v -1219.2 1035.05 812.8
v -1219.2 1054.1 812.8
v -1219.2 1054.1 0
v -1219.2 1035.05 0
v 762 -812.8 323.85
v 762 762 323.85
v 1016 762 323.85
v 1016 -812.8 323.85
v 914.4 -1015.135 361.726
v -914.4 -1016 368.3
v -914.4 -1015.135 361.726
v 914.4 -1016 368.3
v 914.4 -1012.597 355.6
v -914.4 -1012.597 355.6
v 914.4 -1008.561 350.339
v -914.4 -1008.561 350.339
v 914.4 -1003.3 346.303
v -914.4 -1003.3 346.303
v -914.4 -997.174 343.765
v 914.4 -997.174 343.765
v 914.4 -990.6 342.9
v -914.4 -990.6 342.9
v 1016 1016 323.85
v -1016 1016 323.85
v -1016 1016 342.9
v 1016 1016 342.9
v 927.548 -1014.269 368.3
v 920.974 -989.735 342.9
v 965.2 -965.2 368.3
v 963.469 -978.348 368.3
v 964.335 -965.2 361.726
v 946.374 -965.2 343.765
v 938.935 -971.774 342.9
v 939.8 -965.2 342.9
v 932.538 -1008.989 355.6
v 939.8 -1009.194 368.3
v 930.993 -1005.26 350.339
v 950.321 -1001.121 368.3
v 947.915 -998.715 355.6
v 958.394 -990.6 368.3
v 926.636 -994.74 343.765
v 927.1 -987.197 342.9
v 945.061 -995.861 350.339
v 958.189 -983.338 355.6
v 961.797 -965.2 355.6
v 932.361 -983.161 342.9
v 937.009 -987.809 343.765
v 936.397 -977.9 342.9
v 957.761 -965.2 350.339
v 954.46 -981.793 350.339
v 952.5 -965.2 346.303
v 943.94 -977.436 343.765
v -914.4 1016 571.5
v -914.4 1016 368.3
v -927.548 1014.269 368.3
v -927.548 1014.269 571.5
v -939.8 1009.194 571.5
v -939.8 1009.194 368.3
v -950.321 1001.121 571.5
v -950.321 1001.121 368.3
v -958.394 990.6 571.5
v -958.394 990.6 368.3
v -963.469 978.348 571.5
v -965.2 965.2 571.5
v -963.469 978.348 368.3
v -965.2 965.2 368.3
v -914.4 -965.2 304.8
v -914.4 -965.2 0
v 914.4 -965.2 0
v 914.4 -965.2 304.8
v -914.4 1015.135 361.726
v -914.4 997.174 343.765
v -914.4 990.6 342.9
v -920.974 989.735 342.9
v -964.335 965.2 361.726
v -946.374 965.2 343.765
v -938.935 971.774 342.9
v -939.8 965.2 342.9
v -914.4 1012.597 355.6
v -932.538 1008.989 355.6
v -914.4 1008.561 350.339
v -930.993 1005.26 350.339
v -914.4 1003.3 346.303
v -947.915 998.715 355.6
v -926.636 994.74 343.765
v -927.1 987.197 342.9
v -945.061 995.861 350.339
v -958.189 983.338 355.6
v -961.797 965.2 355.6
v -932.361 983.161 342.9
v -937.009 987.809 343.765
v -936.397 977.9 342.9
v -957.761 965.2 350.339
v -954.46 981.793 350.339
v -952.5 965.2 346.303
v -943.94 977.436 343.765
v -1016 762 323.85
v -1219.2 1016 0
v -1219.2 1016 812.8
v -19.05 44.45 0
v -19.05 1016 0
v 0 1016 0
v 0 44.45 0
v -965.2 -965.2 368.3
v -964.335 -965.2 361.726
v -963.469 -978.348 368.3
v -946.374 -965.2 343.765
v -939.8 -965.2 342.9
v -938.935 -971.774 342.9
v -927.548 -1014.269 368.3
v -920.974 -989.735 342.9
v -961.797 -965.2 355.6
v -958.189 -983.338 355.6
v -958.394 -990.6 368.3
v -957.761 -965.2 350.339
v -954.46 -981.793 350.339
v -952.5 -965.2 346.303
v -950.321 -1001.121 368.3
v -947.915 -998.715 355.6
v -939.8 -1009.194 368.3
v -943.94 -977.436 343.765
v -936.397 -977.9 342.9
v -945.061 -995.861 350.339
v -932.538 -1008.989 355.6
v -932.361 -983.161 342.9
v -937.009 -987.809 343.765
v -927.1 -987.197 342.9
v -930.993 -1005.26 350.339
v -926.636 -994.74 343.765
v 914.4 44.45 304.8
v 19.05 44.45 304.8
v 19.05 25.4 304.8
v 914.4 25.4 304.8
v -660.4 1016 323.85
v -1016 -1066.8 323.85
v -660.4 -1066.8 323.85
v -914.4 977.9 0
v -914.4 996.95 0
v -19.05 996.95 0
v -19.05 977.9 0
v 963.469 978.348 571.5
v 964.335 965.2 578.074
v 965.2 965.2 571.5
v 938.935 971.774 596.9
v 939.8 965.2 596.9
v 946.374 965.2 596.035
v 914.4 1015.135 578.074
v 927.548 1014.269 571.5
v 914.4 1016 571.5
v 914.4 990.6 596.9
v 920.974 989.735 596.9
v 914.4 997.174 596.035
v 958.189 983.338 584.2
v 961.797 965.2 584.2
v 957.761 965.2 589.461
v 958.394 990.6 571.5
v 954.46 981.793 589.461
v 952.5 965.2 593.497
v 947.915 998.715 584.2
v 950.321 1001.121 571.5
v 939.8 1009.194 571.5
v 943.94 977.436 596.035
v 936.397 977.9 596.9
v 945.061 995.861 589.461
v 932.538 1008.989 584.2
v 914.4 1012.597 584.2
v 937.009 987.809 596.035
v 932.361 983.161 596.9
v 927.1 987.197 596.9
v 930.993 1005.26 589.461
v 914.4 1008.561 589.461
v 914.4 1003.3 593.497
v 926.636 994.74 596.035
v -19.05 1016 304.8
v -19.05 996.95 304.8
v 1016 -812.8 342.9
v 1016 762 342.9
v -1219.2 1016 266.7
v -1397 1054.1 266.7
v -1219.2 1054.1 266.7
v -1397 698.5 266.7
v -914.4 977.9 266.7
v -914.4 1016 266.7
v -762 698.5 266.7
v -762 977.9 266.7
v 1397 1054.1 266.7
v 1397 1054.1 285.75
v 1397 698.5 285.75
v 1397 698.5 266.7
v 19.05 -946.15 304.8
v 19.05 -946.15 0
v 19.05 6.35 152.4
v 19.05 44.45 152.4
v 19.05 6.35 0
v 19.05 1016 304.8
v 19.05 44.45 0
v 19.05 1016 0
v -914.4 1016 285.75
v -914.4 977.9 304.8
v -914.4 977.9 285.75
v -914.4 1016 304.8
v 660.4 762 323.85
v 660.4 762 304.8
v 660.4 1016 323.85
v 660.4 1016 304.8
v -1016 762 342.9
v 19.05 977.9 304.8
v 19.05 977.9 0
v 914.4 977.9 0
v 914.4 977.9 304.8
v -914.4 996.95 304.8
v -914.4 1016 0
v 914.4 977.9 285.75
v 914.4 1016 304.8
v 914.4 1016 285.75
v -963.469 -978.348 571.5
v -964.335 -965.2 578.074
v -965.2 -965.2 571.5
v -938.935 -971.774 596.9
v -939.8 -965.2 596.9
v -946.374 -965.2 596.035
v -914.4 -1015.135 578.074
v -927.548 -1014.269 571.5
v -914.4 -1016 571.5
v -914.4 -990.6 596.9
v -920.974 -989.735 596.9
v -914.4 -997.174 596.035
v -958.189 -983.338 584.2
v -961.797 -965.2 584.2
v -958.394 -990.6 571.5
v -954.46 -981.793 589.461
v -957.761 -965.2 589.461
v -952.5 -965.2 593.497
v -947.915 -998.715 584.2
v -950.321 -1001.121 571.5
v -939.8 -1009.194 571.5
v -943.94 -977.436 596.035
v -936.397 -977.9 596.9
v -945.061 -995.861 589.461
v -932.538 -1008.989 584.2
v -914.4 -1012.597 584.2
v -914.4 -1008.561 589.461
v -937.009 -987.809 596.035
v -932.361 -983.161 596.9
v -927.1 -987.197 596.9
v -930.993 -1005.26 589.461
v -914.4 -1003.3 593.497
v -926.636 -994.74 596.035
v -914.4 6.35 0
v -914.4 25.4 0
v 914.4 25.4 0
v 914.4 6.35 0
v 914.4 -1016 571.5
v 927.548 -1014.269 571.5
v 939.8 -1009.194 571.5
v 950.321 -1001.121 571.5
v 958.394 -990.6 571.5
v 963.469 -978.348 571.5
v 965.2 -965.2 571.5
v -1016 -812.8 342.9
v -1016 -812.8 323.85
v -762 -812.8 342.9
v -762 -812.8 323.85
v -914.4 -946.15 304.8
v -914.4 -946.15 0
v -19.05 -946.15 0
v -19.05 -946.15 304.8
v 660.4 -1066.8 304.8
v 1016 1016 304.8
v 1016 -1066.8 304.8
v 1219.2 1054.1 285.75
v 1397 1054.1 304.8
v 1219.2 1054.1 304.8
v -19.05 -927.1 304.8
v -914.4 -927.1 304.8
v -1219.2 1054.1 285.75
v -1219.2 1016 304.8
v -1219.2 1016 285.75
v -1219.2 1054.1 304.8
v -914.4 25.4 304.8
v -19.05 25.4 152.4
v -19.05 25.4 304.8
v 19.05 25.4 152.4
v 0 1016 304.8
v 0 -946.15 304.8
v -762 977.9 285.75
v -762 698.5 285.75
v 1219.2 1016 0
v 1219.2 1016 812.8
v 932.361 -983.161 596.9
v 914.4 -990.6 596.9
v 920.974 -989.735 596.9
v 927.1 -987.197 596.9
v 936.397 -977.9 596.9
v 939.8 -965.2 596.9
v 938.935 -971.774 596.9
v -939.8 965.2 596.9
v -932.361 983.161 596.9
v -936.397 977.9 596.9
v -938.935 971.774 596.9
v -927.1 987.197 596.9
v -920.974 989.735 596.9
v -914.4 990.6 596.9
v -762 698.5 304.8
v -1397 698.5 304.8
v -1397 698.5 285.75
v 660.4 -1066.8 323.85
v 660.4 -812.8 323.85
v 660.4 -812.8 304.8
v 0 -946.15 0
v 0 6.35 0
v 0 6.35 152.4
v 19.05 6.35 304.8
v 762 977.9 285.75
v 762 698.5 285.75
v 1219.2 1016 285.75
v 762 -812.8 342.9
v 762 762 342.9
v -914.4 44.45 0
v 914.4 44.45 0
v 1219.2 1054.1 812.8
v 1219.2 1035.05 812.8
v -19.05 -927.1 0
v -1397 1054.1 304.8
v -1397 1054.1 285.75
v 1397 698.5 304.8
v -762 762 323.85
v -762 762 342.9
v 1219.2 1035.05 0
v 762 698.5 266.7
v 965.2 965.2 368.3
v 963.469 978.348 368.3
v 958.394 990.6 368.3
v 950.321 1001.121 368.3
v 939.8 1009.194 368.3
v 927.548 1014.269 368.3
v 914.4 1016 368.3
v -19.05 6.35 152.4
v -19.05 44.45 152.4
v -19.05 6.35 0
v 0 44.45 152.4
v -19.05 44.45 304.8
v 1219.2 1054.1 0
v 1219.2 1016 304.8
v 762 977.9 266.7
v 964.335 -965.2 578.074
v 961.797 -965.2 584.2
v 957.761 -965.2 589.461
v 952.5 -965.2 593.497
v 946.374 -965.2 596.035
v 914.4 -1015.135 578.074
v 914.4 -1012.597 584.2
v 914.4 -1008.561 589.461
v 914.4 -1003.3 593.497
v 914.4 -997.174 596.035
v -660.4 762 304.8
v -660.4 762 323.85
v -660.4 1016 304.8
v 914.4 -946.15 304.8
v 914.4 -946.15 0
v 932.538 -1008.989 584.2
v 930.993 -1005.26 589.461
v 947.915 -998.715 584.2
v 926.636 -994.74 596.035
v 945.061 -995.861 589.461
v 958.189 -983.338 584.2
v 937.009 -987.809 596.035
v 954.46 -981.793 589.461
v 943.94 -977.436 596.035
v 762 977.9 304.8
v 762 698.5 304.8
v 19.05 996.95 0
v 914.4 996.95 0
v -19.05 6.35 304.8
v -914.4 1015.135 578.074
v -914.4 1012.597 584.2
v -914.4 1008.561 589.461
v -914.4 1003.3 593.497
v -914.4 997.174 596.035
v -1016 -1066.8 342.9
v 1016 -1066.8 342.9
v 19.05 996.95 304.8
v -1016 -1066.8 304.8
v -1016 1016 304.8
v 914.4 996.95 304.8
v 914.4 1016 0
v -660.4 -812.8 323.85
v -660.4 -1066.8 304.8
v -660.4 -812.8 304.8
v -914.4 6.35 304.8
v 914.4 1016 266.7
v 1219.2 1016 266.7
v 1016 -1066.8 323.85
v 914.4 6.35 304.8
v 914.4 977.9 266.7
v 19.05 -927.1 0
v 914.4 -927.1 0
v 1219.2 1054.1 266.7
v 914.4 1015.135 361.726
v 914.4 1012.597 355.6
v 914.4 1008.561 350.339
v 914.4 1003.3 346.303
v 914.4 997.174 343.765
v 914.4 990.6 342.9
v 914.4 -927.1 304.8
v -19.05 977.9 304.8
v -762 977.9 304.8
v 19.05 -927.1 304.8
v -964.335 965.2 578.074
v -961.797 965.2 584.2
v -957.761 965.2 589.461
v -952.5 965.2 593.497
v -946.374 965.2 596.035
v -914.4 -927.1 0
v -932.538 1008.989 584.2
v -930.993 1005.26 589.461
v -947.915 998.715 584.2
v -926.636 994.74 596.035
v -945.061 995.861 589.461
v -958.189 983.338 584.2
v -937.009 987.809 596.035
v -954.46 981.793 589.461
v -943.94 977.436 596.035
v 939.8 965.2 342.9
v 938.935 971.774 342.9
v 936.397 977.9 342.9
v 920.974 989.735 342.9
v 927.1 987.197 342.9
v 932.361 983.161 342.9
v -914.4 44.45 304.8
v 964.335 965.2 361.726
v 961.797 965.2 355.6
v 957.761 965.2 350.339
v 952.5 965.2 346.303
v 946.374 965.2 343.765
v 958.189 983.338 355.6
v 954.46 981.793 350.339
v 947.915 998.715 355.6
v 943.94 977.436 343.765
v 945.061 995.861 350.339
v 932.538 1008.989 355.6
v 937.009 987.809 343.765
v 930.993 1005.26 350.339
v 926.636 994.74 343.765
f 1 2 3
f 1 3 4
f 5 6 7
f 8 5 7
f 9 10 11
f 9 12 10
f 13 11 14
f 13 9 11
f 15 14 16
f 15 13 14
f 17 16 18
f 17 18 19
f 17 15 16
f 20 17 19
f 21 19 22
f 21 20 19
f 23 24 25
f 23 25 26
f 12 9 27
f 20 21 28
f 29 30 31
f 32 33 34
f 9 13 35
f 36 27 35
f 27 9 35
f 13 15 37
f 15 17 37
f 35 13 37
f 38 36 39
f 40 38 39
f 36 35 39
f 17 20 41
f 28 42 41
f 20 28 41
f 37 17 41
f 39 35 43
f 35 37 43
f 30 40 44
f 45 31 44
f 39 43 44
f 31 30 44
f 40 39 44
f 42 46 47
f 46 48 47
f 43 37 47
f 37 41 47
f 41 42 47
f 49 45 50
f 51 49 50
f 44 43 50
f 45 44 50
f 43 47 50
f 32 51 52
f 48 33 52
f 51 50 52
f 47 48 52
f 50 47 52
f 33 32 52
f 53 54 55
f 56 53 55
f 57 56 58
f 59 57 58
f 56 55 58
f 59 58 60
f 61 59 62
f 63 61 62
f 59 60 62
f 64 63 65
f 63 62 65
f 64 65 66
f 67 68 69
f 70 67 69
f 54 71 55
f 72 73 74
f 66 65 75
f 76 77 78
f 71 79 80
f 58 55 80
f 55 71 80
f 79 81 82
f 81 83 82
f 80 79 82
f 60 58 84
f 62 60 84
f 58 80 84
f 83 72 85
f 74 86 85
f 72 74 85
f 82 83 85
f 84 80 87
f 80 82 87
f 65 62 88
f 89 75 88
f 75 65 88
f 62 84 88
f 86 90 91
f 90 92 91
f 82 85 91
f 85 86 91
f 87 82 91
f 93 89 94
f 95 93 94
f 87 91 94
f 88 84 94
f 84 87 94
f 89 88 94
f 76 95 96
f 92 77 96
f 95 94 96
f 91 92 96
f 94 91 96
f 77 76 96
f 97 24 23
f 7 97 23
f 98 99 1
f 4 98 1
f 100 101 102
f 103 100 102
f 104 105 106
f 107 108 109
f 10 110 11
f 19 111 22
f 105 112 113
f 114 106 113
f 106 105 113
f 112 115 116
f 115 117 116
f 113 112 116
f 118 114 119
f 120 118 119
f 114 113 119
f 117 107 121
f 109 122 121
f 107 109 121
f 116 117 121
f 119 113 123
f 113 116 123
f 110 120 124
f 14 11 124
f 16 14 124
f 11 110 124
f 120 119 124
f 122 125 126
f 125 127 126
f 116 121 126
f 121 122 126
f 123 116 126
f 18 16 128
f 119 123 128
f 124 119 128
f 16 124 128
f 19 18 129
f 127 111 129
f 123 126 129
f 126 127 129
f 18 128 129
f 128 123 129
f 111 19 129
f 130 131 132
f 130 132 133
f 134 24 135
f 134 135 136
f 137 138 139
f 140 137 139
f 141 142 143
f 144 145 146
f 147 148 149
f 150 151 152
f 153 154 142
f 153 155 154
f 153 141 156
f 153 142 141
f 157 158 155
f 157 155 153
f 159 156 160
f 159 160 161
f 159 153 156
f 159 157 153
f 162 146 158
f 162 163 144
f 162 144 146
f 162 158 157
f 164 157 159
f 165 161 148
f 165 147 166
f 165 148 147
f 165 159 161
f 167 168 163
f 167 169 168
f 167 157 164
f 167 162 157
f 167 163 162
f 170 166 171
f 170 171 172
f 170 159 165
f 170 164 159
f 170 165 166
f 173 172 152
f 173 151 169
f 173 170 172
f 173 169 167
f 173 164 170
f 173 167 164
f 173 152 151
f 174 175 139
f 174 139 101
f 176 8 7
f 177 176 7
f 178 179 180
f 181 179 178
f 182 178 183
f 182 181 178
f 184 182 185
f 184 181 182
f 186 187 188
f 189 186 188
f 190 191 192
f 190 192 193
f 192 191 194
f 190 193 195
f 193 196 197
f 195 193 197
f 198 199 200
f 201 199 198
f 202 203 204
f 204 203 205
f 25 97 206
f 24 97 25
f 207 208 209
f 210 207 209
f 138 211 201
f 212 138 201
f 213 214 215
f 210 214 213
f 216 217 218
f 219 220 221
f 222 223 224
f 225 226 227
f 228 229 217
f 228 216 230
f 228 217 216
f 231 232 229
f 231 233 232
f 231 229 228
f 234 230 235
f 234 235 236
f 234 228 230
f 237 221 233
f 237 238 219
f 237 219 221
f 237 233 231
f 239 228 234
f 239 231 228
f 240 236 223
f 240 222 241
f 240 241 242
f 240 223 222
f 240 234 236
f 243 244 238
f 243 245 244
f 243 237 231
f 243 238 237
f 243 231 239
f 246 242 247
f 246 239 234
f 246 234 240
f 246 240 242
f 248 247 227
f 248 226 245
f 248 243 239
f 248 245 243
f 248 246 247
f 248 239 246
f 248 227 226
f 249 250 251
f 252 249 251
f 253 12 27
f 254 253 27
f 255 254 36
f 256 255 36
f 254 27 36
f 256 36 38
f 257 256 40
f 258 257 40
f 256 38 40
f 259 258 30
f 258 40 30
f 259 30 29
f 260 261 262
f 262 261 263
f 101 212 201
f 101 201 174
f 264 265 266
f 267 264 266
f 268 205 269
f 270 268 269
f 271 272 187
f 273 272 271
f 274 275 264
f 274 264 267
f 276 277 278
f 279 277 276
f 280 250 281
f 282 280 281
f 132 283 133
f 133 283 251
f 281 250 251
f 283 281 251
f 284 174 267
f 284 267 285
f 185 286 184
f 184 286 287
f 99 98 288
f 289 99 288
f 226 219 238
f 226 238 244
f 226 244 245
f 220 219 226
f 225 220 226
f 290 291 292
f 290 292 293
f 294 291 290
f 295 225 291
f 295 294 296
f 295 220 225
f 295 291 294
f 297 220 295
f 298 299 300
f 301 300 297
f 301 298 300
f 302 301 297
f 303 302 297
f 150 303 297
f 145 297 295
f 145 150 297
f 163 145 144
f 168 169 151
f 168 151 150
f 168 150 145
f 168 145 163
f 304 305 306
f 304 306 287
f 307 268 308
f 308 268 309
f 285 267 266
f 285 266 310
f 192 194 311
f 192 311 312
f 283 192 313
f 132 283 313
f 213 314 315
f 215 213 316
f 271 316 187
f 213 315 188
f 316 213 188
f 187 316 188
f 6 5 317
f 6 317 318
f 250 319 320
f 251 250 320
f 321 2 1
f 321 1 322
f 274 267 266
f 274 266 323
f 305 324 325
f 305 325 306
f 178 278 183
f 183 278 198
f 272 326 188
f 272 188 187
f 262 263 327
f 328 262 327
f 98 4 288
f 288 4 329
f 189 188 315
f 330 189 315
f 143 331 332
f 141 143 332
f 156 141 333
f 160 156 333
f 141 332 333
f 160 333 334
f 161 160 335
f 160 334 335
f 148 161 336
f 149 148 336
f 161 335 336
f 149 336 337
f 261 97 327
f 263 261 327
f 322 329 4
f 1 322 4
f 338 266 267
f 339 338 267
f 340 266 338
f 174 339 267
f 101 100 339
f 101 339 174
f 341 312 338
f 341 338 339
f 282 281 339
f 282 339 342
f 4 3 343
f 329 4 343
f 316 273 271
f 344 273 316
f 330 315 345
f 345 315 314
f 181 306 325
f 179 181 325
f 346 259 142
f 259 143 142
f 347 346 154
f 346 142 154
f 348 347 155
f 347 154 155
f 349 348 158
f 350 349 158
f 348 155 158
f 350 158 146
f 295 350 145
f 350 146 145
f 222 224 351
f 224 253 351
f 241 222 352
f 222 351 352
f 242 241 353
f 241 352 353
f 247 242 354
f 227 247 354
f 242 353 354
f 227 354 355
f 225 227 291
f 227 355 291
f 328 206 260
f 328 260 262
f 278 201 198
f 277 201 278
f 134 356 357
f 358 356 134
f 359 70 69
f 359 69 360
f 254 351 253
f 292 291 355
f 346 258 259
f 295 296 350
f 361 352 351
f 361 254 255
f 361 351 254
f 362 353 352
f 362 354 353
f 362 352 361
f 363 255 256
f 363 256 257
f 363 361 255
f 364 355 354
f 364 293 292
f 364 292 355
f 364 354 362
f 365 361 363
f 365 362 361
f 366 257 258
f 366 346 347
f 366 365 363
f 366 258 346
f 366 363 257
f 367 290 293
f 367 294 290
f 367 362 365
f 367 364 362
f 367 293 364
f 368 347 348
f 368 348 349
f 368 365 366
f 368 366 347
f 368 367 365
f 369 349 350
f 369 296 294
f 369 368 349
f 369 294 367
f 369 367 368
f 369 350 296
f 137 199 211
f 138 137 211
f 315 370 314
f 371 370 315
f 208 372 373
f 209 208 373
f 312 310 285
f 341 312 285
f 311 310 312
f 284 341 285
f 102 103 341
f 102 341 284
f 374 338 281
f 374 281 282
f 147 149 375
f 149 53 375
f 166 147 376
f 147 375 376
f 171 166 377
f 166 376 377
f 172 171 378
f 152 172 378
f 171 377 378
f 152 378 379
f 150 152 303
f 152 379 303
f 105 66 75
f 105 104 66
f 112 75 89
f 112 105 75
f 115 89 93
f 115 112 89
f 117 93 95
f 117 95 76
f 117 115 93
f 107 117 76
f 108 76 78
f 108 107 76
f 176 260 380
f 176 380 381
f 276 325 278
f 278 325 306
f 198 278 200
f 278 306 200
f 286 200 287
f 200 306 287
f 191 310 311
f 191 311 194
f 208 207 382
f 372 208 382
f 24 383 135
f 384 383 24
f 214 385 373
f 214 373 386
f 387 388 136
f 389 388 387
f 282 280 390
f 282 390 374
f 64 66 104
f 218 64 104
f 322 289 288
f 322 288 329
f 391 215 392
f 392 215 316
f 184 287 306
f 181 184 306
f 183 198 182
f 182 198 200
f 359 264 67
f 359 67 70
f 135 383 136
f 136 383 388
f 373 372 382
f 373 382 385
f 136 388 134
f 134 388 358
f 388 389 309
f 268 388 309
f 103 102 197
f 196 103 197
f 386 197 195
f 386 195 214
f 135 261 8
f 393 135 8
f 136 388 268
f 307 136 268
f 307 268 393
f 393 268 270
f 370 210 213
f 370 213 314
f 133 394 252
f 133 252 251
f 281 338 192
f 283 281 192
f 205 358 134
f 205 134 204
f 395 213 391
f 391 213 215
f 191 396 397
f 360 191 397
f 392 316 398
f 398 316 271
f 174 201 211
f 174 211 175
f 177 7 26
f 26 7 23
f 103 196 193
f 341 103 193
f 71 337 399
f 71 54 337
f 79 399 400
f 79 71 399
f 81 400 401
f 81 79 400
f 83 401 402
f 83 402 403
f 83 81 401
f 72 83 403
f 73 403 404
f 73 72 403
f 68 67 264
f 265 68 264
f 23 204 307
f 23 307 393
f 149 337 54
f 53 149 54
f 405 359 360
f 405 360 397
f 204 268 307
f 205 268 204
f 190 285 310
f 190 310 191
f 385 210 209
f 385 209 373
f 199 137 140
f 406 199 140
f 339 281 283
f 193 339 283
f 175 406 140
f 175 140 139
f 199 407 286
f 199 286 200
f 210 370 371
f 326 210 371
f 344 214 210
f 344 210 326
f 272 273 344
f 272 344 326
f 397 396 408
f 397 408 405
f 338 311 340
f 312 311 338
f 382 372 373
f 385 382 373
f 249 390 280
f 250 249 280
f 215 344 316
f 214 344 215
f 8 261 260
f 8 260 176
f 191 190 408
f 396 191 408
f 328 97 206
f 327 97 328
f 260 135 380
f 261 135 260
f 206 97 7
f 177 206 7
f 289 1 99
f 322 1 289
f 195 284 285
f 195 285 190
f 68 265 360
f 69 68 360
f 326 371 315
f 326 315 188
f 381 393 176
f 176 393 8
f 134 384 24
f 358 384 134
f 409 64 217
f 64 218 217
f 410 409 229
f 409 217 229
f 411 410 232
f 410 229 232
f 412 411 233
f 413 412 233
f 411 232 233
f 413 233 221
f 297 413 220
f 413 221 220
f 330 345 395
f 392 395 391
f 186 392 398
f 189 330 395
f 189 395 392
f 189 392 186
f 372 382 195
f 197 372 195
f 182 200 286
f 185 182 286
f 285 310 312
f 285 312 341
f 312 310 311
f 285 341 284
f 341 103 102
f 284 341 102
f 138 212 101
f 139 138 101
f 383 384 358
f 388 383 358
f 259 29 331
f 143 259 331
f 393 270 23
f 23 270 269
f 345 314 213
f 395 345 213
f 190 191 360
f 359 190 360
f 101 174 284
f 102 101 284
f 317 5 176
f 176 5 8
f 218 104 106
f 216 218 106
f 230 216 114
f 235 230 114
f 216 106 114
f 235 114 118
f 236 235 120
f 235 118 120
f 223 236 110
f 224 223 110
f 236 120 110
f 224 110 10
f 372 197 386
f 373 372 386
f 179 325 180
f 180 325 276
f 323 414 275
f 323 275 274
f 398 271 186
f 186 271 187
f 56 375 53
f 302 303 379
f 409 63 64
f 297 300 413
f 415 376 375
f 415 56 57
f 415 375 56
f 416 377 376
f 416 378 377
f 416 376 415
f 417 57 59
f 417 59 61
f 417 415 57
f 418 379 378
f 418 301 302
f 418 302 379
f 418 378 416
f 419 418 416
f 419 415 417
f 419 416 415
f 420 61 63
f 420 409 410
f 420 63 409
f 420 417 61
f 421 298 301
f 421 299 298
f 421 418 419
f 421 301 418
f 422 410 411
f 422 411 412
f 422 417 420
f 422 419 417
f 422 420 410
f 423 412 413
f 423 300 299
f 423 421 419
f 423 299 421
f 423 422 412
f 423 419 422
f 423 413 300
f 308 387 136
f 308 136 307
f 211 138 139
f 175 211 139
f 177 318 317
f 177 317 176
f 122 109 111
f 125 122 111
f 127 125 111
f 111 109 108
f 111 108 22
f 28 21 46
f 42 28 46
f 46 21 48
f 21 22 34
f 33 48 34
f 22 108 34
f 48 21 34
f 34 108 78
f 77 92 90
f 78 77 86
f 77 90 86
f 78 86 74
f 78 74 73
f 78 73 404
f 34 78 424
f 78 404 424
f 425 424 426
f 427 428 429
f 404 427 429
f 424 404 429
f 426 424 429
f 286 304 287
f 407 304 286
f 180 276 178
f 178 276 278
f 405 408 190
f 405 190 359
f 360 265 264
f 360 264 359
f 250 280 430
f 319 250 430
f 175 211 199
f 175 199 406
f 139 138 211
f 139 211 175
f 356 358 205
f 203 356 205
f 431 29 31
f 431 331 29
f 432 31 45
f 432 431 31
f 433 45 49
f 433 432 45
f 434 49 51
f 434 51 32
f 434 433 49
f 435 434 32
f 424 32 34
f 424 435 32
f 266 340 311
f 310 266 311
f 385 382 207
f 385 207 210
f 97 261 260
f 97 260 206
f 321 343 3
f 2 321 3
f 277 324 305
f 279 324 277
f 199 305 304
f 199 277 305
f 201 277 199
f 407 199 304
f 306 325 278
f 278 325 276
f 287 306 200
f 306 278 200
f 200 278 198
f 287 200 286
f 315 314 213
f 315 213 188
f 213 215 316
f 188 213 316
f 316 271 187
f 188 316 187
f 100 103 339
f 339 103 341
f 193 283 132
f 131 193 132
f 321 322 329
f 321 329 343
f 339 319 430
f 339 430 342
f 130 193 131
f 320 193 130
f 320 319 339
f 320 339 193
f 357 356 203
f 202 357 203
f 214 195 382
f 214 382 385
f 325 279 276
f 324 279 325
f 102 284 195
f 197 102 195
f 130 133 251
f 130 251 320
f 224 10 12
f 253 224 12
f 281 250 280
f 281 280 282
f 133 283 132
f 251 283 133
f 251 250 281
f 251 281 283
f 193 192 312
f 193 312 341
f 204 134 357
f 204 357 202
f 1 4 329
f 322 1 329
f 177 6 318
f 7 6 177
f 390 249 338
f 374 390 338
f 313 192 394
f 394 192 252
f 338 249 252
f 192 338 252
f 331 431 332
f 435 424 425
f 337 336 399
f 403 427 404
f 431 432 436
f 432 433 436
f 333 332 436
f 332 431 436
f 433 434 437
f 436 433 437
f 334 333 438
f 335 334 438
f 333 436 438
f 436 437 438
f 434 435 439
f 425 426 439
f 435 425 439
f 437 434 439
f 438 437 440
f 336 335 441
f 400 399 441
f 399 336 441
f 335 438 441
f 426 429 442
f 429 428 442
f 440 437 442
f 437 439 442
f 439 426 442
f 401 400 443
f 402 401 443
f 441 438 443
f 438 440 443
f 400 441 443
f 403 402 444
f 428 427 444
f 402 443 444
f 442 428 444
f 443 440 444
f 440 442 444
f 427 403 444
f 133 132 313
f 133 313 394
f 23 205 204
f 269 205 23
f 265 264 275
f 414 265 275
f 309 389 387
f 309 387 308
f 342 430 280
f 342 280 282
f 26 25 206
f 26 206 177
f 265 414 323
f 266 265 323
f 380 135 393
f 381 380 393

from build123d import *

# Parameters (mm, degrees)
F7_W      = 1219.2
F7_H      = 19.05
F8_DEPTH  = 812.8
F10_DEPTH = 812.8
F11_W     = 895.35
F11_H     = 19.05
F12_DEPTH = 304.8
F11_W_2   = 1828.8
F13_W     = 895.35
F13_H     = 19.05
F14_DEPTH = 304.8
F13_W_2   = 1828.8
F15_W     = 19.05
F15_H     = 1962.15
F16_DEPTH = 304.8
F17_W     = 19.05
F17_H     = 1962.15
F18_DEPTH = 304.8
F19_W     = 38.1
F19_H     = 152.4
F20_DEPTH = 1054.101
F21_W     = 38.1
F21_H     = 152.4000000002
F22_DEPTH = 76.2
F23_W     = 1320.8
F23_H     = 254
F24_DEPTH = 19.05
F25_W     = 355.6
F25_H     = 2082.8
F26_DEPTH = 19.05
F27_W     = 2032
F27_H     = 254
F28_DEPTH = 19.05
F29_W     = 254
F29_H     = 1574.8
F30_DEPTH = 19.05
F32_DEPTH = 19.05
F34_DEPTH = 19.05
F36_DEPTH = 254
F37_R     = 25.4


with BuildPart() as f8:
    # F7 (on Top) → F8 (new body)
    with BuildSketch(Plane.XY):
        with Locations((-609.6, 1025.525)):
            Rectangle(F7_W, F7_H)
        with Locations((609.6, 1025.525)):
            Rectangle(F7_W, F7_H)
    extrude(amount=F8_DEPTH)


with BuildPart() as f10:
    # F9 (on Top) → F10 (new body, through all)
    with BuildSketch(Plane.XY):
        Polygon((-1219.2, 1054.1), (-1219.2, 1035.05), (0, 1035.05), (1219.2, 1035.05), (1219.2, 1054.1), align=None)
    extrude(amount=F10_DEPTH)


with BuildPart() as f12:
    # F11 (on Top) → F12 (new body, through all)
    with BuildSketch(Plane.XY):
        with Locations((-466.725, 987.425)):
            Rectangle(F11_W, F11_H)
    extrude(amount=F12_DEPTH)


with BuildPart() as f12b:
    # F11 (on Top) → F12, piece 2 (new body, through all)
    with BuildSketch(Plane.XY):
        with Locations((466.725, 987.425)):
            Rectangle(F11_W, F11_H)
    extrude(amount=F12_DEPTH)


with BuildPart() as f12c:
    # F11 (on Top) → F12, piece 3 (new body, through all)
    with BuildSketch(Plane.XY):
        with Locations((0, 15.875)):
            Rectangle(F11_W_2, F11_H)
    extrude(amount=F12_DEPTH)


with BuildPart() as f12d:
    # F11 (on Top) → F12, piece 4 (new body, through all)
    with BuildSketch(Plane.XY):
        with Locations((0, -955.675)):
            Rectangle(F11_W_2, F11_H)
    extrude(amount=F12_DEPTH)


with BuildPart() as f14:
    # F13 (on Top) → F14 (new body, through all)
    with BuildSketch(Plane.XY):
        with Locations((-466.725, 1006.475)):
            Rectangle(F13_W, F13_H)
    extrude(amount=F14_DEPTH)


with BuildPart() as f14b:
    # F13 (on Top) → F14, piece 2 (new body, through all)
    with BuildSketch(Plane.XY):
        with Locations((466.725, 1006.475)):
            Rectangle(F13_W, F13_H)
    extrude(amount=F14_DEPTH)


with BuildPart() as f14c:
    # F13 (on Top) → F14, piece 3 (new body, through all)
    with BuildSketch(Plane.XY):
        with Locations((0, 34.925)):
            Rectangle(F13_W_2, F13_H)
    extrude(amount=F14_DEPTH)


with BuildPart() as f14d:
    # F13 (on Top) → F14, piece 4 (new body, through all)
    with BuildSketch(Plane.XY):
        with Locations((-466.725, -936.625)):
            Rectangle(F13_W, F13_H)
    extrude(amount=F14_DEPTH)


with BuildPart() as f14e:
    # F13 (on Top) → F14, piece 5 (new body, through all)
    with BuildSketch(Plane.XY):
        with Locations((466.725, -936.625)):
            Rectangle(F13_W, F13_H)
    extrude(amount=F14_DEPTH)


with BuildPart() as f16:
    # F15 (on Top) → F16 (new body, through all)
    with BuildSketch(Plane.XY):
        with Locations((-9.525, 34.925)):
            Rectangle(F15_W, F15_H)
    extrude(amount=F16_DEPTH)


with BuildPart() as f18:
    # F17 (on Top) → F18 (new body, through all)
    with BuildSketch(Plane.XY):
        with Locations((9.525, 34.925)):
            Rectangle(F17_W, F17_H)
    extrude(amount=F18_DEPTH)


with BuildPart() as f20_tool:
    # F19 (on Front) → F20 (new body, through all)
    with BuildSketch(Plane.XZ):
        with Locations((0, 228.6)):
            Rectangle(F19_W, F19_H)
    extrude(amount=-F20_DEPTH)


with BuildPart() as f12c_1:
    add(f12c.part)

    # F20: cut by f20_tool
    add(f20_tool.part, mode=Mode.SUBTRACT)


with BuildPart() as f14c_1:
    add(f14c.part)

    # F20: cut by f20_tool
    add(f20_tool.part, mode=Mode.SUBTRACT)


with BuildPart() as f22_tool:
    # F21 (on Right) → F22 (new body, symmetric)
    with BuildSketch(Plane.YZ):
        with Locations((25.4, 76.2000000001)):
            Rectangle(F21_W, F21_H)
    extrude(amount=F22_DEPTH, both=True)


with BuildPart() as f16_1:
    add(f16.part)

    # F22: cut by f22_tool
    add(f22_tool.part, mode=Mode.SUBTRACT)


with BuildPart() as f18_1:
    add(f18.part)

    # F22: cut by f22_tool
    add(f22_tool.part, mode=Mode.SUBTRACT)


with BuildPart() as f24:
    # F23 (on offset) → F24 (new body)
    with BuildSketch(Plane.XY.offset(304.8)):
        with Locations((0, 889)):
            Rectangle(F23_W, F23_H)
    extrude(amount=F24_DEPTH)


with BuildPart() as f24b:
    # F23 (on offset) → F24, piece 2 (new body)
    with BuildSketch(Plane.XY.offset(304.8)):
        with Locations((0, -939.8)):
            Rectangle(F23_W, F23_H)
    extrude(amount=F24_DEPTH)


with BuildPart() as f26:
    # F25 (on offset) → F26 (new body)
    with BuildSketch(Plane.XY.offset(304.8)):
        with Locations((-838.2, -25.4)):
            Rectangle(F25_W, F25_H)
    extrude(amount=F26_DEPTH)


with BuildPart() as f26b:
    # F25 (on offset) → F26, piece 2 (new body)
    with BuildSketch(Plane.XY.offset(304.8)):
        with Locations((838.2, -25.4)):
            Rectangle(F25_W, F25_H)
    extrude(amount=F26_DEPTH)


with BuildPart() as f28:
    # F27 (on face) → F28 (new body)
    with BuildSketch(Plane.XY.offset(323.85)):
        with Locations((0, 889)):
            Rectangle(F27_W, F27_H)
    extrude(amount=F28_DEPTH)


with BuildPart() as f28b:
    # F27 (on face) → F28, piece 2 (new body)
    with BuildSketch(Plane.XY.offset(323.85)):
        with Locations((0, -939.8)):
            Rectangle(F27_W, F27_H)
    extrude(amount=F28_DEPTH)


with BuildPart() as f30:
    # F29 (on face) → F30 (new body)
    with BuildSketch(Plane.XY.offset(323.85)):
        with Locations((-889, -25.4)):
            Rectangle(F29_W, F29_H)
    extrude(amount=F30_DEPTH)


with BuildPart() as f30b:
    # F29 (on face) → F30, piece 2 (new body)
    with BuildSketch(Plane.XY.offset(323.85)):
        with Locations((889, -25.4)):
            Rectangle(F29_W, F29_H)
    extrude(amount=F30_DEPTH)


with BuildPart() as f32:
    # F31 (on offset) → F32 (new body)
    with BuildSketch(Plane.XY.offset(304.8)):
        Polygon((-1397, 1054.1), (-1397, 698.5), (-762, 698.5), (-762, 977.9), (-914.4, 977.9), (-914.4, 1016), (-1219.2, 1016), (-1219.2, 1054.1), align=None)
    extrude(amount=-F32_DEPTH)


with BuildPart() as f32b:
    # F31 (on offset) → F32, piece 2 (new body)
    with BuildSketch(Plane.XY.offset(304.8)):
        Polygon((1397, 698.5), (1397, 1054.1), (1219.2, 1054.1), (1219.2, 1016), (914.4, 1016), (914.4, 977.9), (762, 977.9), (762, 698.5), align=None)
    extrude(amount=-F32_DEPTH)


with BuildPart() as f34:
    # F33 (on face) → F34 (new body)
    with BuildSketch(Plane(origin=(0, 0, 285.75), x_dir=(1, 0, 0), z_dir=(0, 0, -1))):
        Polygon((-762, -698.5), (-1397, -698.5), (-1397, -1054.1), (-1219.2, -1054.1), (-1219.2, -1016), (-914.4, -1016), (-914.4, -977.9), (-762, -977.9), align=None)
    extrude(amount=F34_DEPTH)


with BuildPart() as f34b:
    # F33 (on face) → F34, piece 2 (new body)
    with BuildSketch(Plane(origin=(0, 0, 285.75), x_dir=(1, 0, 0), z_dir=(0, 0, -1))):
        Polygon((1219.2, -1054.1), (1397, -1054.1), (1397, -698.5), (762, -698.5), (762, -977.9), (914.4, -977.9), (914.4, -1016), (1219.2, -1016), align=None)
    extrude(amount=F34_DEPTH)


with BuildPart() as f36:
    # F35 (on face) → F36 (new body)
    with BuildSketch(Plane.XY.offset(342.9)):
        with BuildLine():
            Line((0, 1016), (-914.4, 1016))
            ThreePointArc((-914.4, 1016), (-950.3210244843, 1001.1210244843), (-965.2, 965.2))
            Line((-965.2, 965.2), (-965.2, -965.2))
            ThreePointArc((-965.2, -965.2), (-950.3210244843, -1001.1210244843), (-914.4, -1016))
            Line((-914.4, -1016), (0, -1016))
            Line((0, -1016), (0, 1016))
        make_face()
        with BuildLine():
            Line((914.4, 1016), (0, 1016))
            Line((0, 1016), (0, -1016))
            Line((0, -1016), (914.4, -1016))
            ThreePointArc((914.4, -1016), (950.3210244843, -1001.1210244843), (965.2, -965.2))
            Line((965.2, -965.2), (965.2, 965.2))
            ThreePointArc((965.2, 965.2), (950.3210244843, 1001.1210244843), (914.4, 1016))
        make_face()
    extrude(amount=F36_DEPTH)

    # F37
    f37_edges = [f36.edges().sort_by_distance(p)[0] for p in [
        (0, -1016, 596.9),
        (0, -1016, 342.9),
        (-950.321024, 1001.121024, 596.9),
        (-965.2, 0, 596.9),
        (-950.321024, -1001.121024, 596.9),
        (950.321024, -1001.121024, 596.9),
        (965.2, 0, 596.9),
        (950.321024, 1001.121024, 596.9),
    ]]
    fillet(f37_edges, radius=F37_R)


solid = Compound([f8.part, f10.part, f12.part, f12b.part, f12d.part, f14.part, f14b.part, f14d.part, f14e.part, f12c_1.part, f14c_1.part, f16_1.part, f18_1.part, f24.part, f24b.part, f26.part, f26b.part, f28.part, f28b.part, f30.part, f30b.part, f32.part, f32b.part, f34.part, f34b.part, f36.part])
